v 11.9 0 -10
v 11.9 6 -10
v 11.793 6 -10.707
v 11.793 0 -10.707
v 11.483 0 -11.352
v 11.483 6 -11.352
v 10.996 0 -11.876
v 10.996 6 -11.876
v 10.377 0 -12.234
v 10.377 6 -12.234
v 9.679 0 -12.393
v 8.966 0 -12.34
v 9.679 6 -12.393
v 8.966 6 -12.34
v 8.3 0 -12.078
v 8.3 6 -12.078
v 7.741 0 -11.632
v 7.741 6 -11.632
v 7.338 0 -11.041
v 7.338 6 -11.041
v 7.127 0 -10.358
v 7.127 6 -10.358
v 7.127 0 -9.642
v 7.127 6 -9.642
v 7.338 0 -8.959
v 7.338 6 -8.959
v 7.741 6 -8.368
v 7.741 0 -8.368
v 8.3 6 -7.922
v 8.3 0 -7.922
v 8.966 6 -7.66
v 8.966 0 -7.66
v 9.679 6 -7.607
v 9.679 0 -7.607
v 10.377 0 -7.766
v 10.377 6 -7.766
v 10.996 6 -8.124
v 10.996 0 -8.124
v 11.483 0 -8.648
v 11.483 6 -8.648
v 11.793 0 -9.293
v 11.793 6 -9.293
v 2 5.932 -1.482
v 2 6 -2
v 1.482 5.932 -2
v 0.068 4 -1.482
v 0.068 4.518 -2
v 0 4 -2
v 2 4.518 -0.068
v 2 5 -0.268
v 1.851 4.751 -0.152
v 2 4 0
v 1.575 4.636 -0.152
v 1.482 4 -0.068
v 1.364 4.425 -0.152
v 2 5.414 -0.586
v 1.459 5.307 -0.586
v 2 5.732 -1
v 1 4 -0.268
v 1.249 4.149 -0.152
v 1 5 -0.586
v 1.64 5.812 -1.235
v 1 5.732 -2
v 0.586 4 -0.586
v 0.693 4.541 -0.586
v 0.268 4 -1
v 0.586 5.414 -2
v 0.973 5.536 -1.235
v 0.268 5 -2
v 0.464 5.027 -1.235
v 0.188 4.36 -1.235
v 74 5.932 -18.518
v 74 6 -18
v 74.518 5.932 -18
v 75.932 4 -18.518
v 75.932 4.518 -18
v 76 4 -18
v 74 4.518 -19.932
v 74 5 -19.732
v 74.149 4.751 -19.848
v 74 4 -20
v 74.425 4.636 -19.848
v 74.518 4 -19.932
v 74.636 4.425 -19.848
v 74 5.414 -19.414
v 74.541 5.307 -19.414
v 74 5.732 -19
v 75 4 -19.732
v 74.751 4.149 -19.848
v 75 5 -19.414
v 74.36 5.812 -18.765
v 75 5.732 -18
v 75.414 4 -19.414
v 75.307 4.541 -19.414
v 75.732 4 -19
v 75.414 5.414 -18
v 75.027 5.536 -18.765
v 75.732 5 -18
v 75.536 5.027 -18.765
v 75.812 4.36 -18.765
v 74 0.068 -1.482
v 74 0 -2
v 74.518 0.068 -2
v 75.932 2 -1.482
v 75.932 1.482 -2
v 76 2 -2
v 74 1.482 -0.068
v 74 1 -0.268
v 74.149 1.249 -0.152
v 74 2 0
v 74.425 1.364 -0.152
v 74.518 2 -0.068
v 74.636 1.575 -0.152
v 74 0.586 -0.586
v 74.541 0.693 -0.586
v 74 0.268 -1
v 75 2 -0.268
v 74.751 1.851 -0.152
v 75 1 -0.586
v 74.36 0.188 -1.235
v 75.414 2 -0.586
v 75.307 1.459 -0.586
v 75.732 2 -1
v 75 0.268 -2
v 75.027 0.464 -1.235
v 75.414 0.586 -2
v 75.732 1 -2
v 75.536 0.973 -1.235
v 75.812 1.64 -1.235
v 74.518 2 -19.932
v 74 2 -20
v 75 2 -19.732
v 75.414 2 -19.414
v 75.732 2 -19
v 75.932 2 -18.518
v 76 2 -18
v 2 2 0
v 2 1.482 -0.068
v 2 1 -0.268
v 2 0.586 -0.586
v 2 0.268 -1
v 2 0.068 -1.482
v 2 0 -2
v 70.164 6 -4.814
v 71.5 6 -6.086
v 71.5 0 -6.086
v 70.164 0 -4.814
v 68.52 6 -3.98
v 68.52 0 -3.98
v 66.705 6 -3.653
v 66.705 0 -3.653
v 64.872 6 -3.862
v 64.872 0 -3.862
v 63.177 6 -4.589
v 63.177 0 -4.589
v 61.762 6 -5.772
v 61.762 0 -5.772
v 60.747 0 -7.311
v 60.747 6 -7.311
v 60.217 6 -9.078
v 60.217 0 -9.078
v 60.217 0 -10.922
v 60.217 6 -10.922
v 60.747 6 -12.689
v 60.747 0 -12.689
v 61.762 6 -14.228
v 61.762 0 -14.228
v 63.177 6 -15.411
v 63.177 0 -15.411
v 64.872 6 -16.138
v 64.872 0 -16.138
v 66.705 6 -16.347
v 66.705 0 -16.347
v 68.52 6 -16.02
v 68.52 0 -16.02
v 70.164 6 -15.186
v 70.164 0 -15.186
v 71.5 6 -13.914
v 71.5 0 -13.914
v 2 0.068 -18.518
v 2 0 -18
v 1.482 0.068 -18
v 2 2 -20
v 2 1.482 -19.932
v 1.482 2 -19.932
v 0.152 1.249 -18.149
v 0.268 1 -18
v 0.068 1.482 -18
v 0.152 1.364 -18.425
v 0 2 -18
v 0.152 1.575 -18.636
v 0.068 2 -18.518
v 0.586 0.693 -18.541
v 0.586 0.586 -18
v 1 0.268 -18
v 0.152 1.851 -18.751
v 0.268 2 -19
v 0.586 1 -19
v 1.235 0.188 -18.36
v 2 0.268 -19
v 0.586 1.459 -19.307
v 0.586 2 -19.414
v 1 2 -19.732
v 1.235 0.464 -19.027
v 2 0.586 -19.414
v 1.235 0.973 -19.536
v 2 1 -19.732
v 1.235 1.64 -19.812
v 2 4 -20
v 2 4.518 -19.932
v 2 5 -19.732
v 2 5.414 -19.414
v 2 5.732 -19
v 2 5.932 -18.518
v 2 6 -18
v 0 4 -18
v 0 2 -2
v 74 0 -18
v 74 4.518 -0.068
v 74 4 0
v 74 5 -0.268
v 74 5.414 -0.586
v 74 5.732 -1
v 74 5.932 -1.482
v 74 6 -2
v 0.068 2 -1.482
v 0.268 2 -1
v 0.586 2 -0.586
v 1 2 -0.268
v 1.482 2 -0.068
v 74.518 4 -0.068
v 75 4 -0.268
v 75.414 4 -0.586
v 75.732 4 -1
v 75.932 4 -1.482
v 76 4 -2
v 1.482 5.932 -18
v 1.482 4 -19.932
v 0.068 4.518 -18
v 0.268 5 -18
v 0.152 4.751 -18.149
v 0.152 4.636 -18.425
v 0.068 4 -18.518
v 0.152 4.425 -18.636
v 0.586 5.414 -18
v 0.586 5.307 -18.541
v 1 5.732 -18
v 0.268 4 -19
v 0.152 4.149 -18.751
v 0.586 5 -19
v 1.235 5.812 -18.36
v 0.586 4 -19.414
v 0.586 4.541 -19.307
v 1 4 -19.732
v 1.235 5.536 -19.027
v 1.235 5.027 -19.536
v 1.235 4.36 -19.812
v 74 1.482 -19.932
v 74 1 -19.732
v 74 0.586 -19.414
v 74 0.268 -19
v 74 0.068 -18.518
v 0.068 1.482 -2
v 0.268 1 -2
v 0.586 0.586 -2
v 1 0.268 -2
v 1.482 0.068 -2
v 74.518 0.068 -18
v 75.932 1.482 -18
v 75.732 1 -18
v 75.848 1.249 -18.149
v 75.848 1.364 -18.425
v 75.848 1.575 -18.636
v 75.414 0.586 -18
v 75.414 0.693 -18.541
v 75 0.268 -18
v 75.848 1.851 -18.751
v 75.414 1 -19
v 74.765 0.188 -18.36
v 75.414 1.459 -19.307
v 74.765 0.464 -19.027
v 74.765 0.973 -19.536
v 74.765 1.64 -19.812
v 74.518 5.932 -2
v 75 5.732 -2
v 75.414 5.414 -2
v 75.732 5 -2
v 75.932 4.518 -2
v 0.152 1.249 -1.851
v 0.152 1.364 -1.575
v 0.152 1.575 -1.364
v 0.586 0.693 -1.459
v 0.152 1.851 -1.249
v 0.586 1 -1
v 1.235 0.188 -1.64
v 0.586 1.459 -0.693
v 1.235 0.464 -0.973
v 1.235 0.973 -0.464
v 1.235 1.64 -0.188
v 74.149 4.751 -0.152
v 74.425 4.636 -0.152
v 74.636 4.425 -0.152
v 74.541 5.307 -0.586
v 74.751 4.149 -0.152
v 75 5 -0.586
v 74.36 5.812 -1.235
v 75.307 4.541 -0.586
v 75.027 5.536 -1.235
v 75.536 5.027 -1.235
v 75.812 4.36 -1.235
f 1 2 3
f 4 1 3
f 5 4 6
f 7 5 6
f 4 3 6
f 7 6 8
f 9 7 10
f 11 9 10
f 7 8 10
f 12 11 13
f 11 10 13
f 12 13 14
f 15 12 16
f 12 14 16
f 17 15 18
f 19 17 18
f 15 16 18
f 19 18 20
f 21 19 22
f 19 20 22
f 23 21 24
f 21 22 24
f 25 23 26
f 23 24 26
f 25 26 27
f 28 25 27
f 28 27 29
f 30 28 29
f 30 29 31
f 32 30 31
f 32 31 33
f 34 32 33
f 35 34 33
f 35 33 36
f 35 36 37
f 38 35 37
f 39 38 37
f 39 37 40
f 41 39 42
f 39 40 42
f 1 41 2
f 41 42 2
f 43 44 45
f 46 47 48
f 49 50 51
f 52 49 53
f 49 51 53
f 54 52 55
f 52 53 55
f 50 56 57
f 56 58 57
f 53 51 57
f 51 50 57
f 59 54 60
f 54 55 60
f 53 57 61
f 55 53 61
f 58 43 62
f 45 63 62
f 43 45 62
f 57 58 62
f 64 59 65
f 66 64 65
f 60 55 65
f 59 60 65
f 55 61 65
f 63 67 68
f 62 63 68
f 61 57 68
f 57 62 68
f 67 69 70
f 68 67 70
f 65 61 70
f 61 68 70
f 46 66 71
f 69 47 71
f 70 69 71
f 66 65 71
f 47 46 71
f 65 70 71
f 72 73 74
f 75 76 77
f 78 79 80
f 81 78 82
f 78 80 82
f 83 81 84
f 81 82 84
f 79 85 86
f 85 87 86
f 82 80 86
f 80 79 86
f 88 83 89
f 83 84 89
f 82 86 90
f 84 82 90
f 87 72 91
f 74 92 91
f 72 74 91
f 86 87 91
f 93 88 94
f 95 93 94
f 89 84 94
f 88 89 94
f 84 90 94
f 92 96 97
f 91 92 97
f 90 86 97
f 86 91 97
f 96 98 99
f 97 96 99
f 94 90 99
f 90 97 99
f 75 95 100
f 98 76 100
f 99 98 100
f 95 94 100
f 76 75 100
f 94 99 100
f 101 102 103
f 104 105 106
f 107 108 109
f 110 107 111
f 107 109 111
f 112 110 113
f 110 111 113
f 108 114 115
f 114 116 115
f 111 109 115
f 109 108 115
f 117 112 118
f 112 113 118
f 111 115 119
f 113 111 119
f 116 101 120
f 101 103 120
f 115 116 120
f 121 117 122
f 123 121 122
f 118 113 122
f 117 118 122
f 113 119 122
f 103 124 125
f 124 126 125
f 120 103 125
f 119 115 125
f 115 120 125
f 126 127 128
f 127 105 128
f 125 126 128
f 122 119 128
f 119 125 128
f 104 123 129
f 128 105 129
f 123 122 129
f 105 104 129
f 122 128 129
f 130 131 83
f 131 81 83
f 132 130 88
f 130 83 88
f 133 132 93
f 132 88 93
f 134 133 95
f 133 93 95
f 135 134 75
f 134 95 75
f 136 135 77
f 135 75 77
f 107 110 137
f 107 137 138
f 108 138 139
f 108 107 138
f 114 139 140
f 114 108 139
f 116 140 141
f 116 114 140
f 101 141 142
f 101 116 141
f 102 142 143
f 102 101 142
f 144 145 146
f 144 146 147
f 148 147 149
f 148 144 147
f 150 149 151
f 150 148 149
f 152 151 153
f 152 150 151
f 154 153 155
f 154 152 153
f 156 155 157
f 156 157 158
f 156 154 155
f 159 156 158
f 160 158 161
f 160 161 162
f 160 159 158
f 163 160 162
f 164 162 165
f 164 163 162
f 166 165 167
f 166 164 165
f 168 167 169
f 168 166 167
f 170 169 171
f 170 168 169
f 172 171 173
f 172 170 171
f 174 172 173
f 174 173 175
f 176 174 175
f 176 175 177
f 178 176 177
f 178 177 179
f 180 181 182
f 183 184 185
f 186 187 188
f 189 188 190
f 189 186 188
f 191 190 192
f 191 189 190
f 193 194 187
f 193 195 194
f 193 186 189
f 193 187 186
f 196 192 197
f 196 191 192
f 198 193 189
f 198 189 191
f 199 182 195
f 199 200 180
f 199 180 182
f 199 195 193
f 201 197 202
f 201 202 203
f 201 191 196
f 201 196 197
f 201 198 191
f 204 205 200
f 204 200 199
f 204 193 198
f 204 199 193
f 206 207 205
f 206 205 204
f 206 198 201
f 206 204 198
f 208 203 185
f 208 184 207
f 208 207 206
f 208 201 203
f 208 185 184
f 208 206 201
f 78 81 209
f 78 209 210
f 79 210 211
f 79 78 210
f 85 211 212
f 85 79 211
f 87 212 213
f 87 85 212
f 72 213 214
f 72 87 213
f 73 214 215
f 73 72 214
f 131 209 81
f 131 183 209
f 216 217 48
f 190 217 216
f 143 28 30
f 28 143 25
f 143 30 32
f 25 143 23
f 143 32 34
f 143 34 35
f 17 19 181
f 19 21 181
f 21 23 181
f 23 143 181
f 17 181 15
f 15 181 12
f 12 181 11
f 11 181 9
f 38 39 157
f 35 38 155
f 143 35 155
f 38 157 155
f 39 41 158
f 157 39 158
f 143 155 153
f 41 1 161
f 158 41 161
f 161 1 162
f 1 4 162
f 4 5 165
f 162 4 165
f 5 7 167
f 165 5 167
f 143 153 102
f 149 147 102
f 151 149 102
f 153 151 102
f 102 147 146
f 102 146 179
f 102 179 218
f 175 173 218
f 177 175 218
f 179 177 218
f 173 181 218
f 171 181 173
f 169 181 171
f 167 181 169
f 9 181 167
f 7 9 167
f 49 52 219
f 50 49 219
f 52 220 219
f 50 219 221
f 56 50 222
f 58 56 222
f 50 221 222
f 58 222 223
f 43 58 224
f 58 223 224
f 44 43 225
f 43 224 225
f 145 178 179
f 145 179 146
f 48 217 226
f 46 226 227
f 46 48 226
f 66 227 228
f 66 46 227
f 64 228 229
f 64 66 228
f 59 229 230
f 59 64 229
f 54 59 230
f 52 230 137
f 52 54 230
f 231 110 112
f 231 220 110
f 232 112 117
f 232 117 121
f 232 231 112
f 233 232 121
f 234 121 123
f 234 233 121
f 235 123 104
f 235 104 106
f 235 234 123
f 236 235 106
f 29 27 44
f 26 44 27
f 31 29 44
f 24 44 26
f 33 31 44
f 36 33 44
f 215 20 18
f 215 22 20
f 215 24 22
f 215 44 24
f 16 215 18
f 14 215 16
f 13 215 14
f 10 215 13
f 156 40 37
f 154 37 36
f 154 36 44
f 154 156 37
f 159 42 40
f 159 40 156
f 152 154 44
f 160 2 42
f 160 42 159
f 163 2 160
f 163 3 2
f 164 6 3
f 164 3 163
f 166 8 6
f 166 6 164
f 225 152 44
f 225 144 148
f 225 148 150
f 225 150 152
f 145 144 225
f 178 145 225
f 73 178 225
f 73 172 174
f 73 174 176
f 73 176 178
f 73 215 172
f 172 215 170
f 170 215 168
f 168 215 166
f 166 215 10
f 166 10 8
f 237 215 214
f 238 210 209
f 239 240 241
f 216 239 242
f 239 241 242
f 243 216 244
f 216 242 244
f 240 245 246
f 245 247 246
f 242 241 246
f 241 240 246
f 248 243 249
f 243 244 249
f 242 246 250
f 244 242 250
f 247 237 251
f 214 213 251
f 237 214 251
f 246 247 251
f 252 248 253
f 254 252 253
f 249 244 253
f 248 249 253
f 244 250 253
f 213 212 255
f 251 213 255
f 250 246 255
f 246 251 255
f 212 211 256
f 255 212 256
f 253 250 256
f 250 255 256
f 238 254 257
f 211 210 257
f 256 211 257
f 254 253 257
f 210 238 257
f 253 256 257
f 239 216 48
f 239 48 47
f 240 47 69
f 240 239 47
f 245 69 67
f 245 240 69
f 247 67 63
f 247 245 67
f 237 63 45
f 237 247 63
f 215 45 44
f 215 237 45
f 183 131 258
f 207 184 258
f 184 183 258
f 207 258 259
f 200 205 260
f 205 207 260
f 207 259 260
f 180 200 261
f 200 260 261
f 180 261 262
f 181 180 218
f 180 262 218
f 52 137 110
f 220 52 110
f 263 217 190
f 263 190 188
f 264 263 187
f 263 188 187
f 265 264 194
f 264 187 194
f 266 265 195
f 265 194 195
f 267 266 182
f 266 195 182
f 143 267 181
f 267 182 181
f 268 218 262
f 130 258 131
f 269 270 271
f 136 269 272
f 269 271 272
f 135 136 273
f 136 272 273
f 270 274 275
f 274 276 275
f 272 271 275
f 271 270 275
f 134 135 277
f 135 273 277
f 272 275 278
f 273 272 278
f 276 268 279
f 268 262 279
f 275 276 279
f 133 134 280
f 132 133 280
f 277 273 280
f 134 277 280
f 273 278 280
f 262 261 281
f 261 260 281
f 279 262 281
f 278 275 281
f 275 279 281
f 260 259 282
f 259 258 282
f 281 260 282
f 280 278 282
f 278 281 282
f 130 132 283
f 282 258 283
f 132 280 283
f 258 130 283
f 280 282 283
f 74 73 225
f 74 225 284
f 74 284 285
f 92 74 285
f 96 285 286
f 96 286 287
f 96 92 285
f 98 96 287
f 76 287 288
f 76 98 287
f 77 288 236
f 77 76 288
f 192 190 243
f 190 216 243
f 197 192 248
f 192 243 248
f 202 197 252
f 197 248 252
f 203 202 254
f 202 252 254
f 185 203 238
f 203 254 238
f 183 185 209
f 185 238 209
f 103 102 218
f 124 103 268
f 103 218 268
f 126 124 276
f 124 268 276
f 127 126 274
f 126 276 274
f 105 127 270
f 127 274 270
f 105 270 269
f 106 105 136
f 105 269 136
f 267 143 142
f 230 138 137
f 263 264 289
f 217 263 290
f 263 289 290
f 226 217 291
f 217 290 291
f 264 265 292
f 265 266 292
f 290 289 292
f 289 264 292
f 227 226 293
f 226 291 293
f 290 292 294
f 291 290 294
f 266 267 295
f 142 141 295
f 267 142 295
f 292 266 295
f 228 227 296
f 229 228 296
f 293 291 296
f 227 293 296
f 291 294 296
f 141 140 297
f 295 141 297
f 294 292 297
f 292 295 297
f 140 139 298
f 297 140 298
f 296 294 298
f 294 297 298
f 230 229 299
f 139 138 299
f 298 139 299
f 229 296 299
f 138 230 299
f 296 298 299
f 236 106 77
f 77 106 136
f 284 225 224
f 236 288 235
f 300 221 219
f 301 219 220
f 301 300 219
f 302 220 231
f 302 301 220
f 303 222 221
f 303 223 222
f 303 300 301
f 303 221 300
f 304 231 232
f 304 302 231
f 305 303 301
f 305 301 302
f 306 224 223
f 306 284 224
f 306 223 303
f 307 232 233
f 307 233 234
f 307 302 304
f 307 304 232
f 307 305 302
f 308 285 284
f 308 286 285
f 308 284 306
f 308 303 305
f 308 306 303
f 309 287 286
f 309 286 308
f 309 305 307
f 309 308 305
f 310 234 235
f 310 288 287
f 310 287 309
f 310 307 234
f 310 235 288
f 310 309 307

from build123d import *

# Parameters (mm, degrees)
SKETCH1_W           = 76
SKETCH1_H           = 20
BOSS_EXTRUDE1_DEPTH = 6
SKETCH2_R           = 2.4
CUT_EXTRUDE1_DEPTH  = 6
FILLET1_R           = 2


with BuildPart() as part:
    # Sketch1 → Boss-Extrude1 (new body)
    with BuildSketch(Plane(origin=(0, 0, 0), x_dir=(1, 0, 0), z_dir=(0, 1, 0))):
        with Locations((38, 10)):
            Rectangle(SKETCH1_W, SKETCH1_H)
    extrude(amount=BOSS_EXTRUDE1_DEPTH)

    # Sketch2 → Cut-Extrude1 (cut)
    with BuildSketch(Plane(origin=(0, 6, 0), x_dir=(1, 0, 0), z_dir=(0, 1, 0))):
        with Locations((9.5, 10)):
            Circle(SKETCH2_R)
        with BuildLine():
            Line((71.5, 13.914396505), (71.5, 6.085603495))
            ThreePointArc((71.5, 6.085603495), (60.15, 10), (71.5, 13.914396505))
        make_face()
    extrude(amount=-CUT_EXTRUDE1_DEPTH, mode=Mode.SUBTRACT)

    # Fillet1
    fillet1_edges = [part.edges().sort_by_distance(p)[0] for p in [
        (76, 6, -10),
        (38, 6, -20),
        (0, 6, -10),
        (38, 0, -20),
        (76, 0, -10),
        (38, 0, 0),
        (0, 0, -10),
        (38, 6, 0),
        (0, 3, -20),
        (76, 3, -20),
        (76, 3, 0),
        (0, 3, 0),
    ]]
    fillet(fillet1_edges, radius=FILLET1_R)


solid = part.part
